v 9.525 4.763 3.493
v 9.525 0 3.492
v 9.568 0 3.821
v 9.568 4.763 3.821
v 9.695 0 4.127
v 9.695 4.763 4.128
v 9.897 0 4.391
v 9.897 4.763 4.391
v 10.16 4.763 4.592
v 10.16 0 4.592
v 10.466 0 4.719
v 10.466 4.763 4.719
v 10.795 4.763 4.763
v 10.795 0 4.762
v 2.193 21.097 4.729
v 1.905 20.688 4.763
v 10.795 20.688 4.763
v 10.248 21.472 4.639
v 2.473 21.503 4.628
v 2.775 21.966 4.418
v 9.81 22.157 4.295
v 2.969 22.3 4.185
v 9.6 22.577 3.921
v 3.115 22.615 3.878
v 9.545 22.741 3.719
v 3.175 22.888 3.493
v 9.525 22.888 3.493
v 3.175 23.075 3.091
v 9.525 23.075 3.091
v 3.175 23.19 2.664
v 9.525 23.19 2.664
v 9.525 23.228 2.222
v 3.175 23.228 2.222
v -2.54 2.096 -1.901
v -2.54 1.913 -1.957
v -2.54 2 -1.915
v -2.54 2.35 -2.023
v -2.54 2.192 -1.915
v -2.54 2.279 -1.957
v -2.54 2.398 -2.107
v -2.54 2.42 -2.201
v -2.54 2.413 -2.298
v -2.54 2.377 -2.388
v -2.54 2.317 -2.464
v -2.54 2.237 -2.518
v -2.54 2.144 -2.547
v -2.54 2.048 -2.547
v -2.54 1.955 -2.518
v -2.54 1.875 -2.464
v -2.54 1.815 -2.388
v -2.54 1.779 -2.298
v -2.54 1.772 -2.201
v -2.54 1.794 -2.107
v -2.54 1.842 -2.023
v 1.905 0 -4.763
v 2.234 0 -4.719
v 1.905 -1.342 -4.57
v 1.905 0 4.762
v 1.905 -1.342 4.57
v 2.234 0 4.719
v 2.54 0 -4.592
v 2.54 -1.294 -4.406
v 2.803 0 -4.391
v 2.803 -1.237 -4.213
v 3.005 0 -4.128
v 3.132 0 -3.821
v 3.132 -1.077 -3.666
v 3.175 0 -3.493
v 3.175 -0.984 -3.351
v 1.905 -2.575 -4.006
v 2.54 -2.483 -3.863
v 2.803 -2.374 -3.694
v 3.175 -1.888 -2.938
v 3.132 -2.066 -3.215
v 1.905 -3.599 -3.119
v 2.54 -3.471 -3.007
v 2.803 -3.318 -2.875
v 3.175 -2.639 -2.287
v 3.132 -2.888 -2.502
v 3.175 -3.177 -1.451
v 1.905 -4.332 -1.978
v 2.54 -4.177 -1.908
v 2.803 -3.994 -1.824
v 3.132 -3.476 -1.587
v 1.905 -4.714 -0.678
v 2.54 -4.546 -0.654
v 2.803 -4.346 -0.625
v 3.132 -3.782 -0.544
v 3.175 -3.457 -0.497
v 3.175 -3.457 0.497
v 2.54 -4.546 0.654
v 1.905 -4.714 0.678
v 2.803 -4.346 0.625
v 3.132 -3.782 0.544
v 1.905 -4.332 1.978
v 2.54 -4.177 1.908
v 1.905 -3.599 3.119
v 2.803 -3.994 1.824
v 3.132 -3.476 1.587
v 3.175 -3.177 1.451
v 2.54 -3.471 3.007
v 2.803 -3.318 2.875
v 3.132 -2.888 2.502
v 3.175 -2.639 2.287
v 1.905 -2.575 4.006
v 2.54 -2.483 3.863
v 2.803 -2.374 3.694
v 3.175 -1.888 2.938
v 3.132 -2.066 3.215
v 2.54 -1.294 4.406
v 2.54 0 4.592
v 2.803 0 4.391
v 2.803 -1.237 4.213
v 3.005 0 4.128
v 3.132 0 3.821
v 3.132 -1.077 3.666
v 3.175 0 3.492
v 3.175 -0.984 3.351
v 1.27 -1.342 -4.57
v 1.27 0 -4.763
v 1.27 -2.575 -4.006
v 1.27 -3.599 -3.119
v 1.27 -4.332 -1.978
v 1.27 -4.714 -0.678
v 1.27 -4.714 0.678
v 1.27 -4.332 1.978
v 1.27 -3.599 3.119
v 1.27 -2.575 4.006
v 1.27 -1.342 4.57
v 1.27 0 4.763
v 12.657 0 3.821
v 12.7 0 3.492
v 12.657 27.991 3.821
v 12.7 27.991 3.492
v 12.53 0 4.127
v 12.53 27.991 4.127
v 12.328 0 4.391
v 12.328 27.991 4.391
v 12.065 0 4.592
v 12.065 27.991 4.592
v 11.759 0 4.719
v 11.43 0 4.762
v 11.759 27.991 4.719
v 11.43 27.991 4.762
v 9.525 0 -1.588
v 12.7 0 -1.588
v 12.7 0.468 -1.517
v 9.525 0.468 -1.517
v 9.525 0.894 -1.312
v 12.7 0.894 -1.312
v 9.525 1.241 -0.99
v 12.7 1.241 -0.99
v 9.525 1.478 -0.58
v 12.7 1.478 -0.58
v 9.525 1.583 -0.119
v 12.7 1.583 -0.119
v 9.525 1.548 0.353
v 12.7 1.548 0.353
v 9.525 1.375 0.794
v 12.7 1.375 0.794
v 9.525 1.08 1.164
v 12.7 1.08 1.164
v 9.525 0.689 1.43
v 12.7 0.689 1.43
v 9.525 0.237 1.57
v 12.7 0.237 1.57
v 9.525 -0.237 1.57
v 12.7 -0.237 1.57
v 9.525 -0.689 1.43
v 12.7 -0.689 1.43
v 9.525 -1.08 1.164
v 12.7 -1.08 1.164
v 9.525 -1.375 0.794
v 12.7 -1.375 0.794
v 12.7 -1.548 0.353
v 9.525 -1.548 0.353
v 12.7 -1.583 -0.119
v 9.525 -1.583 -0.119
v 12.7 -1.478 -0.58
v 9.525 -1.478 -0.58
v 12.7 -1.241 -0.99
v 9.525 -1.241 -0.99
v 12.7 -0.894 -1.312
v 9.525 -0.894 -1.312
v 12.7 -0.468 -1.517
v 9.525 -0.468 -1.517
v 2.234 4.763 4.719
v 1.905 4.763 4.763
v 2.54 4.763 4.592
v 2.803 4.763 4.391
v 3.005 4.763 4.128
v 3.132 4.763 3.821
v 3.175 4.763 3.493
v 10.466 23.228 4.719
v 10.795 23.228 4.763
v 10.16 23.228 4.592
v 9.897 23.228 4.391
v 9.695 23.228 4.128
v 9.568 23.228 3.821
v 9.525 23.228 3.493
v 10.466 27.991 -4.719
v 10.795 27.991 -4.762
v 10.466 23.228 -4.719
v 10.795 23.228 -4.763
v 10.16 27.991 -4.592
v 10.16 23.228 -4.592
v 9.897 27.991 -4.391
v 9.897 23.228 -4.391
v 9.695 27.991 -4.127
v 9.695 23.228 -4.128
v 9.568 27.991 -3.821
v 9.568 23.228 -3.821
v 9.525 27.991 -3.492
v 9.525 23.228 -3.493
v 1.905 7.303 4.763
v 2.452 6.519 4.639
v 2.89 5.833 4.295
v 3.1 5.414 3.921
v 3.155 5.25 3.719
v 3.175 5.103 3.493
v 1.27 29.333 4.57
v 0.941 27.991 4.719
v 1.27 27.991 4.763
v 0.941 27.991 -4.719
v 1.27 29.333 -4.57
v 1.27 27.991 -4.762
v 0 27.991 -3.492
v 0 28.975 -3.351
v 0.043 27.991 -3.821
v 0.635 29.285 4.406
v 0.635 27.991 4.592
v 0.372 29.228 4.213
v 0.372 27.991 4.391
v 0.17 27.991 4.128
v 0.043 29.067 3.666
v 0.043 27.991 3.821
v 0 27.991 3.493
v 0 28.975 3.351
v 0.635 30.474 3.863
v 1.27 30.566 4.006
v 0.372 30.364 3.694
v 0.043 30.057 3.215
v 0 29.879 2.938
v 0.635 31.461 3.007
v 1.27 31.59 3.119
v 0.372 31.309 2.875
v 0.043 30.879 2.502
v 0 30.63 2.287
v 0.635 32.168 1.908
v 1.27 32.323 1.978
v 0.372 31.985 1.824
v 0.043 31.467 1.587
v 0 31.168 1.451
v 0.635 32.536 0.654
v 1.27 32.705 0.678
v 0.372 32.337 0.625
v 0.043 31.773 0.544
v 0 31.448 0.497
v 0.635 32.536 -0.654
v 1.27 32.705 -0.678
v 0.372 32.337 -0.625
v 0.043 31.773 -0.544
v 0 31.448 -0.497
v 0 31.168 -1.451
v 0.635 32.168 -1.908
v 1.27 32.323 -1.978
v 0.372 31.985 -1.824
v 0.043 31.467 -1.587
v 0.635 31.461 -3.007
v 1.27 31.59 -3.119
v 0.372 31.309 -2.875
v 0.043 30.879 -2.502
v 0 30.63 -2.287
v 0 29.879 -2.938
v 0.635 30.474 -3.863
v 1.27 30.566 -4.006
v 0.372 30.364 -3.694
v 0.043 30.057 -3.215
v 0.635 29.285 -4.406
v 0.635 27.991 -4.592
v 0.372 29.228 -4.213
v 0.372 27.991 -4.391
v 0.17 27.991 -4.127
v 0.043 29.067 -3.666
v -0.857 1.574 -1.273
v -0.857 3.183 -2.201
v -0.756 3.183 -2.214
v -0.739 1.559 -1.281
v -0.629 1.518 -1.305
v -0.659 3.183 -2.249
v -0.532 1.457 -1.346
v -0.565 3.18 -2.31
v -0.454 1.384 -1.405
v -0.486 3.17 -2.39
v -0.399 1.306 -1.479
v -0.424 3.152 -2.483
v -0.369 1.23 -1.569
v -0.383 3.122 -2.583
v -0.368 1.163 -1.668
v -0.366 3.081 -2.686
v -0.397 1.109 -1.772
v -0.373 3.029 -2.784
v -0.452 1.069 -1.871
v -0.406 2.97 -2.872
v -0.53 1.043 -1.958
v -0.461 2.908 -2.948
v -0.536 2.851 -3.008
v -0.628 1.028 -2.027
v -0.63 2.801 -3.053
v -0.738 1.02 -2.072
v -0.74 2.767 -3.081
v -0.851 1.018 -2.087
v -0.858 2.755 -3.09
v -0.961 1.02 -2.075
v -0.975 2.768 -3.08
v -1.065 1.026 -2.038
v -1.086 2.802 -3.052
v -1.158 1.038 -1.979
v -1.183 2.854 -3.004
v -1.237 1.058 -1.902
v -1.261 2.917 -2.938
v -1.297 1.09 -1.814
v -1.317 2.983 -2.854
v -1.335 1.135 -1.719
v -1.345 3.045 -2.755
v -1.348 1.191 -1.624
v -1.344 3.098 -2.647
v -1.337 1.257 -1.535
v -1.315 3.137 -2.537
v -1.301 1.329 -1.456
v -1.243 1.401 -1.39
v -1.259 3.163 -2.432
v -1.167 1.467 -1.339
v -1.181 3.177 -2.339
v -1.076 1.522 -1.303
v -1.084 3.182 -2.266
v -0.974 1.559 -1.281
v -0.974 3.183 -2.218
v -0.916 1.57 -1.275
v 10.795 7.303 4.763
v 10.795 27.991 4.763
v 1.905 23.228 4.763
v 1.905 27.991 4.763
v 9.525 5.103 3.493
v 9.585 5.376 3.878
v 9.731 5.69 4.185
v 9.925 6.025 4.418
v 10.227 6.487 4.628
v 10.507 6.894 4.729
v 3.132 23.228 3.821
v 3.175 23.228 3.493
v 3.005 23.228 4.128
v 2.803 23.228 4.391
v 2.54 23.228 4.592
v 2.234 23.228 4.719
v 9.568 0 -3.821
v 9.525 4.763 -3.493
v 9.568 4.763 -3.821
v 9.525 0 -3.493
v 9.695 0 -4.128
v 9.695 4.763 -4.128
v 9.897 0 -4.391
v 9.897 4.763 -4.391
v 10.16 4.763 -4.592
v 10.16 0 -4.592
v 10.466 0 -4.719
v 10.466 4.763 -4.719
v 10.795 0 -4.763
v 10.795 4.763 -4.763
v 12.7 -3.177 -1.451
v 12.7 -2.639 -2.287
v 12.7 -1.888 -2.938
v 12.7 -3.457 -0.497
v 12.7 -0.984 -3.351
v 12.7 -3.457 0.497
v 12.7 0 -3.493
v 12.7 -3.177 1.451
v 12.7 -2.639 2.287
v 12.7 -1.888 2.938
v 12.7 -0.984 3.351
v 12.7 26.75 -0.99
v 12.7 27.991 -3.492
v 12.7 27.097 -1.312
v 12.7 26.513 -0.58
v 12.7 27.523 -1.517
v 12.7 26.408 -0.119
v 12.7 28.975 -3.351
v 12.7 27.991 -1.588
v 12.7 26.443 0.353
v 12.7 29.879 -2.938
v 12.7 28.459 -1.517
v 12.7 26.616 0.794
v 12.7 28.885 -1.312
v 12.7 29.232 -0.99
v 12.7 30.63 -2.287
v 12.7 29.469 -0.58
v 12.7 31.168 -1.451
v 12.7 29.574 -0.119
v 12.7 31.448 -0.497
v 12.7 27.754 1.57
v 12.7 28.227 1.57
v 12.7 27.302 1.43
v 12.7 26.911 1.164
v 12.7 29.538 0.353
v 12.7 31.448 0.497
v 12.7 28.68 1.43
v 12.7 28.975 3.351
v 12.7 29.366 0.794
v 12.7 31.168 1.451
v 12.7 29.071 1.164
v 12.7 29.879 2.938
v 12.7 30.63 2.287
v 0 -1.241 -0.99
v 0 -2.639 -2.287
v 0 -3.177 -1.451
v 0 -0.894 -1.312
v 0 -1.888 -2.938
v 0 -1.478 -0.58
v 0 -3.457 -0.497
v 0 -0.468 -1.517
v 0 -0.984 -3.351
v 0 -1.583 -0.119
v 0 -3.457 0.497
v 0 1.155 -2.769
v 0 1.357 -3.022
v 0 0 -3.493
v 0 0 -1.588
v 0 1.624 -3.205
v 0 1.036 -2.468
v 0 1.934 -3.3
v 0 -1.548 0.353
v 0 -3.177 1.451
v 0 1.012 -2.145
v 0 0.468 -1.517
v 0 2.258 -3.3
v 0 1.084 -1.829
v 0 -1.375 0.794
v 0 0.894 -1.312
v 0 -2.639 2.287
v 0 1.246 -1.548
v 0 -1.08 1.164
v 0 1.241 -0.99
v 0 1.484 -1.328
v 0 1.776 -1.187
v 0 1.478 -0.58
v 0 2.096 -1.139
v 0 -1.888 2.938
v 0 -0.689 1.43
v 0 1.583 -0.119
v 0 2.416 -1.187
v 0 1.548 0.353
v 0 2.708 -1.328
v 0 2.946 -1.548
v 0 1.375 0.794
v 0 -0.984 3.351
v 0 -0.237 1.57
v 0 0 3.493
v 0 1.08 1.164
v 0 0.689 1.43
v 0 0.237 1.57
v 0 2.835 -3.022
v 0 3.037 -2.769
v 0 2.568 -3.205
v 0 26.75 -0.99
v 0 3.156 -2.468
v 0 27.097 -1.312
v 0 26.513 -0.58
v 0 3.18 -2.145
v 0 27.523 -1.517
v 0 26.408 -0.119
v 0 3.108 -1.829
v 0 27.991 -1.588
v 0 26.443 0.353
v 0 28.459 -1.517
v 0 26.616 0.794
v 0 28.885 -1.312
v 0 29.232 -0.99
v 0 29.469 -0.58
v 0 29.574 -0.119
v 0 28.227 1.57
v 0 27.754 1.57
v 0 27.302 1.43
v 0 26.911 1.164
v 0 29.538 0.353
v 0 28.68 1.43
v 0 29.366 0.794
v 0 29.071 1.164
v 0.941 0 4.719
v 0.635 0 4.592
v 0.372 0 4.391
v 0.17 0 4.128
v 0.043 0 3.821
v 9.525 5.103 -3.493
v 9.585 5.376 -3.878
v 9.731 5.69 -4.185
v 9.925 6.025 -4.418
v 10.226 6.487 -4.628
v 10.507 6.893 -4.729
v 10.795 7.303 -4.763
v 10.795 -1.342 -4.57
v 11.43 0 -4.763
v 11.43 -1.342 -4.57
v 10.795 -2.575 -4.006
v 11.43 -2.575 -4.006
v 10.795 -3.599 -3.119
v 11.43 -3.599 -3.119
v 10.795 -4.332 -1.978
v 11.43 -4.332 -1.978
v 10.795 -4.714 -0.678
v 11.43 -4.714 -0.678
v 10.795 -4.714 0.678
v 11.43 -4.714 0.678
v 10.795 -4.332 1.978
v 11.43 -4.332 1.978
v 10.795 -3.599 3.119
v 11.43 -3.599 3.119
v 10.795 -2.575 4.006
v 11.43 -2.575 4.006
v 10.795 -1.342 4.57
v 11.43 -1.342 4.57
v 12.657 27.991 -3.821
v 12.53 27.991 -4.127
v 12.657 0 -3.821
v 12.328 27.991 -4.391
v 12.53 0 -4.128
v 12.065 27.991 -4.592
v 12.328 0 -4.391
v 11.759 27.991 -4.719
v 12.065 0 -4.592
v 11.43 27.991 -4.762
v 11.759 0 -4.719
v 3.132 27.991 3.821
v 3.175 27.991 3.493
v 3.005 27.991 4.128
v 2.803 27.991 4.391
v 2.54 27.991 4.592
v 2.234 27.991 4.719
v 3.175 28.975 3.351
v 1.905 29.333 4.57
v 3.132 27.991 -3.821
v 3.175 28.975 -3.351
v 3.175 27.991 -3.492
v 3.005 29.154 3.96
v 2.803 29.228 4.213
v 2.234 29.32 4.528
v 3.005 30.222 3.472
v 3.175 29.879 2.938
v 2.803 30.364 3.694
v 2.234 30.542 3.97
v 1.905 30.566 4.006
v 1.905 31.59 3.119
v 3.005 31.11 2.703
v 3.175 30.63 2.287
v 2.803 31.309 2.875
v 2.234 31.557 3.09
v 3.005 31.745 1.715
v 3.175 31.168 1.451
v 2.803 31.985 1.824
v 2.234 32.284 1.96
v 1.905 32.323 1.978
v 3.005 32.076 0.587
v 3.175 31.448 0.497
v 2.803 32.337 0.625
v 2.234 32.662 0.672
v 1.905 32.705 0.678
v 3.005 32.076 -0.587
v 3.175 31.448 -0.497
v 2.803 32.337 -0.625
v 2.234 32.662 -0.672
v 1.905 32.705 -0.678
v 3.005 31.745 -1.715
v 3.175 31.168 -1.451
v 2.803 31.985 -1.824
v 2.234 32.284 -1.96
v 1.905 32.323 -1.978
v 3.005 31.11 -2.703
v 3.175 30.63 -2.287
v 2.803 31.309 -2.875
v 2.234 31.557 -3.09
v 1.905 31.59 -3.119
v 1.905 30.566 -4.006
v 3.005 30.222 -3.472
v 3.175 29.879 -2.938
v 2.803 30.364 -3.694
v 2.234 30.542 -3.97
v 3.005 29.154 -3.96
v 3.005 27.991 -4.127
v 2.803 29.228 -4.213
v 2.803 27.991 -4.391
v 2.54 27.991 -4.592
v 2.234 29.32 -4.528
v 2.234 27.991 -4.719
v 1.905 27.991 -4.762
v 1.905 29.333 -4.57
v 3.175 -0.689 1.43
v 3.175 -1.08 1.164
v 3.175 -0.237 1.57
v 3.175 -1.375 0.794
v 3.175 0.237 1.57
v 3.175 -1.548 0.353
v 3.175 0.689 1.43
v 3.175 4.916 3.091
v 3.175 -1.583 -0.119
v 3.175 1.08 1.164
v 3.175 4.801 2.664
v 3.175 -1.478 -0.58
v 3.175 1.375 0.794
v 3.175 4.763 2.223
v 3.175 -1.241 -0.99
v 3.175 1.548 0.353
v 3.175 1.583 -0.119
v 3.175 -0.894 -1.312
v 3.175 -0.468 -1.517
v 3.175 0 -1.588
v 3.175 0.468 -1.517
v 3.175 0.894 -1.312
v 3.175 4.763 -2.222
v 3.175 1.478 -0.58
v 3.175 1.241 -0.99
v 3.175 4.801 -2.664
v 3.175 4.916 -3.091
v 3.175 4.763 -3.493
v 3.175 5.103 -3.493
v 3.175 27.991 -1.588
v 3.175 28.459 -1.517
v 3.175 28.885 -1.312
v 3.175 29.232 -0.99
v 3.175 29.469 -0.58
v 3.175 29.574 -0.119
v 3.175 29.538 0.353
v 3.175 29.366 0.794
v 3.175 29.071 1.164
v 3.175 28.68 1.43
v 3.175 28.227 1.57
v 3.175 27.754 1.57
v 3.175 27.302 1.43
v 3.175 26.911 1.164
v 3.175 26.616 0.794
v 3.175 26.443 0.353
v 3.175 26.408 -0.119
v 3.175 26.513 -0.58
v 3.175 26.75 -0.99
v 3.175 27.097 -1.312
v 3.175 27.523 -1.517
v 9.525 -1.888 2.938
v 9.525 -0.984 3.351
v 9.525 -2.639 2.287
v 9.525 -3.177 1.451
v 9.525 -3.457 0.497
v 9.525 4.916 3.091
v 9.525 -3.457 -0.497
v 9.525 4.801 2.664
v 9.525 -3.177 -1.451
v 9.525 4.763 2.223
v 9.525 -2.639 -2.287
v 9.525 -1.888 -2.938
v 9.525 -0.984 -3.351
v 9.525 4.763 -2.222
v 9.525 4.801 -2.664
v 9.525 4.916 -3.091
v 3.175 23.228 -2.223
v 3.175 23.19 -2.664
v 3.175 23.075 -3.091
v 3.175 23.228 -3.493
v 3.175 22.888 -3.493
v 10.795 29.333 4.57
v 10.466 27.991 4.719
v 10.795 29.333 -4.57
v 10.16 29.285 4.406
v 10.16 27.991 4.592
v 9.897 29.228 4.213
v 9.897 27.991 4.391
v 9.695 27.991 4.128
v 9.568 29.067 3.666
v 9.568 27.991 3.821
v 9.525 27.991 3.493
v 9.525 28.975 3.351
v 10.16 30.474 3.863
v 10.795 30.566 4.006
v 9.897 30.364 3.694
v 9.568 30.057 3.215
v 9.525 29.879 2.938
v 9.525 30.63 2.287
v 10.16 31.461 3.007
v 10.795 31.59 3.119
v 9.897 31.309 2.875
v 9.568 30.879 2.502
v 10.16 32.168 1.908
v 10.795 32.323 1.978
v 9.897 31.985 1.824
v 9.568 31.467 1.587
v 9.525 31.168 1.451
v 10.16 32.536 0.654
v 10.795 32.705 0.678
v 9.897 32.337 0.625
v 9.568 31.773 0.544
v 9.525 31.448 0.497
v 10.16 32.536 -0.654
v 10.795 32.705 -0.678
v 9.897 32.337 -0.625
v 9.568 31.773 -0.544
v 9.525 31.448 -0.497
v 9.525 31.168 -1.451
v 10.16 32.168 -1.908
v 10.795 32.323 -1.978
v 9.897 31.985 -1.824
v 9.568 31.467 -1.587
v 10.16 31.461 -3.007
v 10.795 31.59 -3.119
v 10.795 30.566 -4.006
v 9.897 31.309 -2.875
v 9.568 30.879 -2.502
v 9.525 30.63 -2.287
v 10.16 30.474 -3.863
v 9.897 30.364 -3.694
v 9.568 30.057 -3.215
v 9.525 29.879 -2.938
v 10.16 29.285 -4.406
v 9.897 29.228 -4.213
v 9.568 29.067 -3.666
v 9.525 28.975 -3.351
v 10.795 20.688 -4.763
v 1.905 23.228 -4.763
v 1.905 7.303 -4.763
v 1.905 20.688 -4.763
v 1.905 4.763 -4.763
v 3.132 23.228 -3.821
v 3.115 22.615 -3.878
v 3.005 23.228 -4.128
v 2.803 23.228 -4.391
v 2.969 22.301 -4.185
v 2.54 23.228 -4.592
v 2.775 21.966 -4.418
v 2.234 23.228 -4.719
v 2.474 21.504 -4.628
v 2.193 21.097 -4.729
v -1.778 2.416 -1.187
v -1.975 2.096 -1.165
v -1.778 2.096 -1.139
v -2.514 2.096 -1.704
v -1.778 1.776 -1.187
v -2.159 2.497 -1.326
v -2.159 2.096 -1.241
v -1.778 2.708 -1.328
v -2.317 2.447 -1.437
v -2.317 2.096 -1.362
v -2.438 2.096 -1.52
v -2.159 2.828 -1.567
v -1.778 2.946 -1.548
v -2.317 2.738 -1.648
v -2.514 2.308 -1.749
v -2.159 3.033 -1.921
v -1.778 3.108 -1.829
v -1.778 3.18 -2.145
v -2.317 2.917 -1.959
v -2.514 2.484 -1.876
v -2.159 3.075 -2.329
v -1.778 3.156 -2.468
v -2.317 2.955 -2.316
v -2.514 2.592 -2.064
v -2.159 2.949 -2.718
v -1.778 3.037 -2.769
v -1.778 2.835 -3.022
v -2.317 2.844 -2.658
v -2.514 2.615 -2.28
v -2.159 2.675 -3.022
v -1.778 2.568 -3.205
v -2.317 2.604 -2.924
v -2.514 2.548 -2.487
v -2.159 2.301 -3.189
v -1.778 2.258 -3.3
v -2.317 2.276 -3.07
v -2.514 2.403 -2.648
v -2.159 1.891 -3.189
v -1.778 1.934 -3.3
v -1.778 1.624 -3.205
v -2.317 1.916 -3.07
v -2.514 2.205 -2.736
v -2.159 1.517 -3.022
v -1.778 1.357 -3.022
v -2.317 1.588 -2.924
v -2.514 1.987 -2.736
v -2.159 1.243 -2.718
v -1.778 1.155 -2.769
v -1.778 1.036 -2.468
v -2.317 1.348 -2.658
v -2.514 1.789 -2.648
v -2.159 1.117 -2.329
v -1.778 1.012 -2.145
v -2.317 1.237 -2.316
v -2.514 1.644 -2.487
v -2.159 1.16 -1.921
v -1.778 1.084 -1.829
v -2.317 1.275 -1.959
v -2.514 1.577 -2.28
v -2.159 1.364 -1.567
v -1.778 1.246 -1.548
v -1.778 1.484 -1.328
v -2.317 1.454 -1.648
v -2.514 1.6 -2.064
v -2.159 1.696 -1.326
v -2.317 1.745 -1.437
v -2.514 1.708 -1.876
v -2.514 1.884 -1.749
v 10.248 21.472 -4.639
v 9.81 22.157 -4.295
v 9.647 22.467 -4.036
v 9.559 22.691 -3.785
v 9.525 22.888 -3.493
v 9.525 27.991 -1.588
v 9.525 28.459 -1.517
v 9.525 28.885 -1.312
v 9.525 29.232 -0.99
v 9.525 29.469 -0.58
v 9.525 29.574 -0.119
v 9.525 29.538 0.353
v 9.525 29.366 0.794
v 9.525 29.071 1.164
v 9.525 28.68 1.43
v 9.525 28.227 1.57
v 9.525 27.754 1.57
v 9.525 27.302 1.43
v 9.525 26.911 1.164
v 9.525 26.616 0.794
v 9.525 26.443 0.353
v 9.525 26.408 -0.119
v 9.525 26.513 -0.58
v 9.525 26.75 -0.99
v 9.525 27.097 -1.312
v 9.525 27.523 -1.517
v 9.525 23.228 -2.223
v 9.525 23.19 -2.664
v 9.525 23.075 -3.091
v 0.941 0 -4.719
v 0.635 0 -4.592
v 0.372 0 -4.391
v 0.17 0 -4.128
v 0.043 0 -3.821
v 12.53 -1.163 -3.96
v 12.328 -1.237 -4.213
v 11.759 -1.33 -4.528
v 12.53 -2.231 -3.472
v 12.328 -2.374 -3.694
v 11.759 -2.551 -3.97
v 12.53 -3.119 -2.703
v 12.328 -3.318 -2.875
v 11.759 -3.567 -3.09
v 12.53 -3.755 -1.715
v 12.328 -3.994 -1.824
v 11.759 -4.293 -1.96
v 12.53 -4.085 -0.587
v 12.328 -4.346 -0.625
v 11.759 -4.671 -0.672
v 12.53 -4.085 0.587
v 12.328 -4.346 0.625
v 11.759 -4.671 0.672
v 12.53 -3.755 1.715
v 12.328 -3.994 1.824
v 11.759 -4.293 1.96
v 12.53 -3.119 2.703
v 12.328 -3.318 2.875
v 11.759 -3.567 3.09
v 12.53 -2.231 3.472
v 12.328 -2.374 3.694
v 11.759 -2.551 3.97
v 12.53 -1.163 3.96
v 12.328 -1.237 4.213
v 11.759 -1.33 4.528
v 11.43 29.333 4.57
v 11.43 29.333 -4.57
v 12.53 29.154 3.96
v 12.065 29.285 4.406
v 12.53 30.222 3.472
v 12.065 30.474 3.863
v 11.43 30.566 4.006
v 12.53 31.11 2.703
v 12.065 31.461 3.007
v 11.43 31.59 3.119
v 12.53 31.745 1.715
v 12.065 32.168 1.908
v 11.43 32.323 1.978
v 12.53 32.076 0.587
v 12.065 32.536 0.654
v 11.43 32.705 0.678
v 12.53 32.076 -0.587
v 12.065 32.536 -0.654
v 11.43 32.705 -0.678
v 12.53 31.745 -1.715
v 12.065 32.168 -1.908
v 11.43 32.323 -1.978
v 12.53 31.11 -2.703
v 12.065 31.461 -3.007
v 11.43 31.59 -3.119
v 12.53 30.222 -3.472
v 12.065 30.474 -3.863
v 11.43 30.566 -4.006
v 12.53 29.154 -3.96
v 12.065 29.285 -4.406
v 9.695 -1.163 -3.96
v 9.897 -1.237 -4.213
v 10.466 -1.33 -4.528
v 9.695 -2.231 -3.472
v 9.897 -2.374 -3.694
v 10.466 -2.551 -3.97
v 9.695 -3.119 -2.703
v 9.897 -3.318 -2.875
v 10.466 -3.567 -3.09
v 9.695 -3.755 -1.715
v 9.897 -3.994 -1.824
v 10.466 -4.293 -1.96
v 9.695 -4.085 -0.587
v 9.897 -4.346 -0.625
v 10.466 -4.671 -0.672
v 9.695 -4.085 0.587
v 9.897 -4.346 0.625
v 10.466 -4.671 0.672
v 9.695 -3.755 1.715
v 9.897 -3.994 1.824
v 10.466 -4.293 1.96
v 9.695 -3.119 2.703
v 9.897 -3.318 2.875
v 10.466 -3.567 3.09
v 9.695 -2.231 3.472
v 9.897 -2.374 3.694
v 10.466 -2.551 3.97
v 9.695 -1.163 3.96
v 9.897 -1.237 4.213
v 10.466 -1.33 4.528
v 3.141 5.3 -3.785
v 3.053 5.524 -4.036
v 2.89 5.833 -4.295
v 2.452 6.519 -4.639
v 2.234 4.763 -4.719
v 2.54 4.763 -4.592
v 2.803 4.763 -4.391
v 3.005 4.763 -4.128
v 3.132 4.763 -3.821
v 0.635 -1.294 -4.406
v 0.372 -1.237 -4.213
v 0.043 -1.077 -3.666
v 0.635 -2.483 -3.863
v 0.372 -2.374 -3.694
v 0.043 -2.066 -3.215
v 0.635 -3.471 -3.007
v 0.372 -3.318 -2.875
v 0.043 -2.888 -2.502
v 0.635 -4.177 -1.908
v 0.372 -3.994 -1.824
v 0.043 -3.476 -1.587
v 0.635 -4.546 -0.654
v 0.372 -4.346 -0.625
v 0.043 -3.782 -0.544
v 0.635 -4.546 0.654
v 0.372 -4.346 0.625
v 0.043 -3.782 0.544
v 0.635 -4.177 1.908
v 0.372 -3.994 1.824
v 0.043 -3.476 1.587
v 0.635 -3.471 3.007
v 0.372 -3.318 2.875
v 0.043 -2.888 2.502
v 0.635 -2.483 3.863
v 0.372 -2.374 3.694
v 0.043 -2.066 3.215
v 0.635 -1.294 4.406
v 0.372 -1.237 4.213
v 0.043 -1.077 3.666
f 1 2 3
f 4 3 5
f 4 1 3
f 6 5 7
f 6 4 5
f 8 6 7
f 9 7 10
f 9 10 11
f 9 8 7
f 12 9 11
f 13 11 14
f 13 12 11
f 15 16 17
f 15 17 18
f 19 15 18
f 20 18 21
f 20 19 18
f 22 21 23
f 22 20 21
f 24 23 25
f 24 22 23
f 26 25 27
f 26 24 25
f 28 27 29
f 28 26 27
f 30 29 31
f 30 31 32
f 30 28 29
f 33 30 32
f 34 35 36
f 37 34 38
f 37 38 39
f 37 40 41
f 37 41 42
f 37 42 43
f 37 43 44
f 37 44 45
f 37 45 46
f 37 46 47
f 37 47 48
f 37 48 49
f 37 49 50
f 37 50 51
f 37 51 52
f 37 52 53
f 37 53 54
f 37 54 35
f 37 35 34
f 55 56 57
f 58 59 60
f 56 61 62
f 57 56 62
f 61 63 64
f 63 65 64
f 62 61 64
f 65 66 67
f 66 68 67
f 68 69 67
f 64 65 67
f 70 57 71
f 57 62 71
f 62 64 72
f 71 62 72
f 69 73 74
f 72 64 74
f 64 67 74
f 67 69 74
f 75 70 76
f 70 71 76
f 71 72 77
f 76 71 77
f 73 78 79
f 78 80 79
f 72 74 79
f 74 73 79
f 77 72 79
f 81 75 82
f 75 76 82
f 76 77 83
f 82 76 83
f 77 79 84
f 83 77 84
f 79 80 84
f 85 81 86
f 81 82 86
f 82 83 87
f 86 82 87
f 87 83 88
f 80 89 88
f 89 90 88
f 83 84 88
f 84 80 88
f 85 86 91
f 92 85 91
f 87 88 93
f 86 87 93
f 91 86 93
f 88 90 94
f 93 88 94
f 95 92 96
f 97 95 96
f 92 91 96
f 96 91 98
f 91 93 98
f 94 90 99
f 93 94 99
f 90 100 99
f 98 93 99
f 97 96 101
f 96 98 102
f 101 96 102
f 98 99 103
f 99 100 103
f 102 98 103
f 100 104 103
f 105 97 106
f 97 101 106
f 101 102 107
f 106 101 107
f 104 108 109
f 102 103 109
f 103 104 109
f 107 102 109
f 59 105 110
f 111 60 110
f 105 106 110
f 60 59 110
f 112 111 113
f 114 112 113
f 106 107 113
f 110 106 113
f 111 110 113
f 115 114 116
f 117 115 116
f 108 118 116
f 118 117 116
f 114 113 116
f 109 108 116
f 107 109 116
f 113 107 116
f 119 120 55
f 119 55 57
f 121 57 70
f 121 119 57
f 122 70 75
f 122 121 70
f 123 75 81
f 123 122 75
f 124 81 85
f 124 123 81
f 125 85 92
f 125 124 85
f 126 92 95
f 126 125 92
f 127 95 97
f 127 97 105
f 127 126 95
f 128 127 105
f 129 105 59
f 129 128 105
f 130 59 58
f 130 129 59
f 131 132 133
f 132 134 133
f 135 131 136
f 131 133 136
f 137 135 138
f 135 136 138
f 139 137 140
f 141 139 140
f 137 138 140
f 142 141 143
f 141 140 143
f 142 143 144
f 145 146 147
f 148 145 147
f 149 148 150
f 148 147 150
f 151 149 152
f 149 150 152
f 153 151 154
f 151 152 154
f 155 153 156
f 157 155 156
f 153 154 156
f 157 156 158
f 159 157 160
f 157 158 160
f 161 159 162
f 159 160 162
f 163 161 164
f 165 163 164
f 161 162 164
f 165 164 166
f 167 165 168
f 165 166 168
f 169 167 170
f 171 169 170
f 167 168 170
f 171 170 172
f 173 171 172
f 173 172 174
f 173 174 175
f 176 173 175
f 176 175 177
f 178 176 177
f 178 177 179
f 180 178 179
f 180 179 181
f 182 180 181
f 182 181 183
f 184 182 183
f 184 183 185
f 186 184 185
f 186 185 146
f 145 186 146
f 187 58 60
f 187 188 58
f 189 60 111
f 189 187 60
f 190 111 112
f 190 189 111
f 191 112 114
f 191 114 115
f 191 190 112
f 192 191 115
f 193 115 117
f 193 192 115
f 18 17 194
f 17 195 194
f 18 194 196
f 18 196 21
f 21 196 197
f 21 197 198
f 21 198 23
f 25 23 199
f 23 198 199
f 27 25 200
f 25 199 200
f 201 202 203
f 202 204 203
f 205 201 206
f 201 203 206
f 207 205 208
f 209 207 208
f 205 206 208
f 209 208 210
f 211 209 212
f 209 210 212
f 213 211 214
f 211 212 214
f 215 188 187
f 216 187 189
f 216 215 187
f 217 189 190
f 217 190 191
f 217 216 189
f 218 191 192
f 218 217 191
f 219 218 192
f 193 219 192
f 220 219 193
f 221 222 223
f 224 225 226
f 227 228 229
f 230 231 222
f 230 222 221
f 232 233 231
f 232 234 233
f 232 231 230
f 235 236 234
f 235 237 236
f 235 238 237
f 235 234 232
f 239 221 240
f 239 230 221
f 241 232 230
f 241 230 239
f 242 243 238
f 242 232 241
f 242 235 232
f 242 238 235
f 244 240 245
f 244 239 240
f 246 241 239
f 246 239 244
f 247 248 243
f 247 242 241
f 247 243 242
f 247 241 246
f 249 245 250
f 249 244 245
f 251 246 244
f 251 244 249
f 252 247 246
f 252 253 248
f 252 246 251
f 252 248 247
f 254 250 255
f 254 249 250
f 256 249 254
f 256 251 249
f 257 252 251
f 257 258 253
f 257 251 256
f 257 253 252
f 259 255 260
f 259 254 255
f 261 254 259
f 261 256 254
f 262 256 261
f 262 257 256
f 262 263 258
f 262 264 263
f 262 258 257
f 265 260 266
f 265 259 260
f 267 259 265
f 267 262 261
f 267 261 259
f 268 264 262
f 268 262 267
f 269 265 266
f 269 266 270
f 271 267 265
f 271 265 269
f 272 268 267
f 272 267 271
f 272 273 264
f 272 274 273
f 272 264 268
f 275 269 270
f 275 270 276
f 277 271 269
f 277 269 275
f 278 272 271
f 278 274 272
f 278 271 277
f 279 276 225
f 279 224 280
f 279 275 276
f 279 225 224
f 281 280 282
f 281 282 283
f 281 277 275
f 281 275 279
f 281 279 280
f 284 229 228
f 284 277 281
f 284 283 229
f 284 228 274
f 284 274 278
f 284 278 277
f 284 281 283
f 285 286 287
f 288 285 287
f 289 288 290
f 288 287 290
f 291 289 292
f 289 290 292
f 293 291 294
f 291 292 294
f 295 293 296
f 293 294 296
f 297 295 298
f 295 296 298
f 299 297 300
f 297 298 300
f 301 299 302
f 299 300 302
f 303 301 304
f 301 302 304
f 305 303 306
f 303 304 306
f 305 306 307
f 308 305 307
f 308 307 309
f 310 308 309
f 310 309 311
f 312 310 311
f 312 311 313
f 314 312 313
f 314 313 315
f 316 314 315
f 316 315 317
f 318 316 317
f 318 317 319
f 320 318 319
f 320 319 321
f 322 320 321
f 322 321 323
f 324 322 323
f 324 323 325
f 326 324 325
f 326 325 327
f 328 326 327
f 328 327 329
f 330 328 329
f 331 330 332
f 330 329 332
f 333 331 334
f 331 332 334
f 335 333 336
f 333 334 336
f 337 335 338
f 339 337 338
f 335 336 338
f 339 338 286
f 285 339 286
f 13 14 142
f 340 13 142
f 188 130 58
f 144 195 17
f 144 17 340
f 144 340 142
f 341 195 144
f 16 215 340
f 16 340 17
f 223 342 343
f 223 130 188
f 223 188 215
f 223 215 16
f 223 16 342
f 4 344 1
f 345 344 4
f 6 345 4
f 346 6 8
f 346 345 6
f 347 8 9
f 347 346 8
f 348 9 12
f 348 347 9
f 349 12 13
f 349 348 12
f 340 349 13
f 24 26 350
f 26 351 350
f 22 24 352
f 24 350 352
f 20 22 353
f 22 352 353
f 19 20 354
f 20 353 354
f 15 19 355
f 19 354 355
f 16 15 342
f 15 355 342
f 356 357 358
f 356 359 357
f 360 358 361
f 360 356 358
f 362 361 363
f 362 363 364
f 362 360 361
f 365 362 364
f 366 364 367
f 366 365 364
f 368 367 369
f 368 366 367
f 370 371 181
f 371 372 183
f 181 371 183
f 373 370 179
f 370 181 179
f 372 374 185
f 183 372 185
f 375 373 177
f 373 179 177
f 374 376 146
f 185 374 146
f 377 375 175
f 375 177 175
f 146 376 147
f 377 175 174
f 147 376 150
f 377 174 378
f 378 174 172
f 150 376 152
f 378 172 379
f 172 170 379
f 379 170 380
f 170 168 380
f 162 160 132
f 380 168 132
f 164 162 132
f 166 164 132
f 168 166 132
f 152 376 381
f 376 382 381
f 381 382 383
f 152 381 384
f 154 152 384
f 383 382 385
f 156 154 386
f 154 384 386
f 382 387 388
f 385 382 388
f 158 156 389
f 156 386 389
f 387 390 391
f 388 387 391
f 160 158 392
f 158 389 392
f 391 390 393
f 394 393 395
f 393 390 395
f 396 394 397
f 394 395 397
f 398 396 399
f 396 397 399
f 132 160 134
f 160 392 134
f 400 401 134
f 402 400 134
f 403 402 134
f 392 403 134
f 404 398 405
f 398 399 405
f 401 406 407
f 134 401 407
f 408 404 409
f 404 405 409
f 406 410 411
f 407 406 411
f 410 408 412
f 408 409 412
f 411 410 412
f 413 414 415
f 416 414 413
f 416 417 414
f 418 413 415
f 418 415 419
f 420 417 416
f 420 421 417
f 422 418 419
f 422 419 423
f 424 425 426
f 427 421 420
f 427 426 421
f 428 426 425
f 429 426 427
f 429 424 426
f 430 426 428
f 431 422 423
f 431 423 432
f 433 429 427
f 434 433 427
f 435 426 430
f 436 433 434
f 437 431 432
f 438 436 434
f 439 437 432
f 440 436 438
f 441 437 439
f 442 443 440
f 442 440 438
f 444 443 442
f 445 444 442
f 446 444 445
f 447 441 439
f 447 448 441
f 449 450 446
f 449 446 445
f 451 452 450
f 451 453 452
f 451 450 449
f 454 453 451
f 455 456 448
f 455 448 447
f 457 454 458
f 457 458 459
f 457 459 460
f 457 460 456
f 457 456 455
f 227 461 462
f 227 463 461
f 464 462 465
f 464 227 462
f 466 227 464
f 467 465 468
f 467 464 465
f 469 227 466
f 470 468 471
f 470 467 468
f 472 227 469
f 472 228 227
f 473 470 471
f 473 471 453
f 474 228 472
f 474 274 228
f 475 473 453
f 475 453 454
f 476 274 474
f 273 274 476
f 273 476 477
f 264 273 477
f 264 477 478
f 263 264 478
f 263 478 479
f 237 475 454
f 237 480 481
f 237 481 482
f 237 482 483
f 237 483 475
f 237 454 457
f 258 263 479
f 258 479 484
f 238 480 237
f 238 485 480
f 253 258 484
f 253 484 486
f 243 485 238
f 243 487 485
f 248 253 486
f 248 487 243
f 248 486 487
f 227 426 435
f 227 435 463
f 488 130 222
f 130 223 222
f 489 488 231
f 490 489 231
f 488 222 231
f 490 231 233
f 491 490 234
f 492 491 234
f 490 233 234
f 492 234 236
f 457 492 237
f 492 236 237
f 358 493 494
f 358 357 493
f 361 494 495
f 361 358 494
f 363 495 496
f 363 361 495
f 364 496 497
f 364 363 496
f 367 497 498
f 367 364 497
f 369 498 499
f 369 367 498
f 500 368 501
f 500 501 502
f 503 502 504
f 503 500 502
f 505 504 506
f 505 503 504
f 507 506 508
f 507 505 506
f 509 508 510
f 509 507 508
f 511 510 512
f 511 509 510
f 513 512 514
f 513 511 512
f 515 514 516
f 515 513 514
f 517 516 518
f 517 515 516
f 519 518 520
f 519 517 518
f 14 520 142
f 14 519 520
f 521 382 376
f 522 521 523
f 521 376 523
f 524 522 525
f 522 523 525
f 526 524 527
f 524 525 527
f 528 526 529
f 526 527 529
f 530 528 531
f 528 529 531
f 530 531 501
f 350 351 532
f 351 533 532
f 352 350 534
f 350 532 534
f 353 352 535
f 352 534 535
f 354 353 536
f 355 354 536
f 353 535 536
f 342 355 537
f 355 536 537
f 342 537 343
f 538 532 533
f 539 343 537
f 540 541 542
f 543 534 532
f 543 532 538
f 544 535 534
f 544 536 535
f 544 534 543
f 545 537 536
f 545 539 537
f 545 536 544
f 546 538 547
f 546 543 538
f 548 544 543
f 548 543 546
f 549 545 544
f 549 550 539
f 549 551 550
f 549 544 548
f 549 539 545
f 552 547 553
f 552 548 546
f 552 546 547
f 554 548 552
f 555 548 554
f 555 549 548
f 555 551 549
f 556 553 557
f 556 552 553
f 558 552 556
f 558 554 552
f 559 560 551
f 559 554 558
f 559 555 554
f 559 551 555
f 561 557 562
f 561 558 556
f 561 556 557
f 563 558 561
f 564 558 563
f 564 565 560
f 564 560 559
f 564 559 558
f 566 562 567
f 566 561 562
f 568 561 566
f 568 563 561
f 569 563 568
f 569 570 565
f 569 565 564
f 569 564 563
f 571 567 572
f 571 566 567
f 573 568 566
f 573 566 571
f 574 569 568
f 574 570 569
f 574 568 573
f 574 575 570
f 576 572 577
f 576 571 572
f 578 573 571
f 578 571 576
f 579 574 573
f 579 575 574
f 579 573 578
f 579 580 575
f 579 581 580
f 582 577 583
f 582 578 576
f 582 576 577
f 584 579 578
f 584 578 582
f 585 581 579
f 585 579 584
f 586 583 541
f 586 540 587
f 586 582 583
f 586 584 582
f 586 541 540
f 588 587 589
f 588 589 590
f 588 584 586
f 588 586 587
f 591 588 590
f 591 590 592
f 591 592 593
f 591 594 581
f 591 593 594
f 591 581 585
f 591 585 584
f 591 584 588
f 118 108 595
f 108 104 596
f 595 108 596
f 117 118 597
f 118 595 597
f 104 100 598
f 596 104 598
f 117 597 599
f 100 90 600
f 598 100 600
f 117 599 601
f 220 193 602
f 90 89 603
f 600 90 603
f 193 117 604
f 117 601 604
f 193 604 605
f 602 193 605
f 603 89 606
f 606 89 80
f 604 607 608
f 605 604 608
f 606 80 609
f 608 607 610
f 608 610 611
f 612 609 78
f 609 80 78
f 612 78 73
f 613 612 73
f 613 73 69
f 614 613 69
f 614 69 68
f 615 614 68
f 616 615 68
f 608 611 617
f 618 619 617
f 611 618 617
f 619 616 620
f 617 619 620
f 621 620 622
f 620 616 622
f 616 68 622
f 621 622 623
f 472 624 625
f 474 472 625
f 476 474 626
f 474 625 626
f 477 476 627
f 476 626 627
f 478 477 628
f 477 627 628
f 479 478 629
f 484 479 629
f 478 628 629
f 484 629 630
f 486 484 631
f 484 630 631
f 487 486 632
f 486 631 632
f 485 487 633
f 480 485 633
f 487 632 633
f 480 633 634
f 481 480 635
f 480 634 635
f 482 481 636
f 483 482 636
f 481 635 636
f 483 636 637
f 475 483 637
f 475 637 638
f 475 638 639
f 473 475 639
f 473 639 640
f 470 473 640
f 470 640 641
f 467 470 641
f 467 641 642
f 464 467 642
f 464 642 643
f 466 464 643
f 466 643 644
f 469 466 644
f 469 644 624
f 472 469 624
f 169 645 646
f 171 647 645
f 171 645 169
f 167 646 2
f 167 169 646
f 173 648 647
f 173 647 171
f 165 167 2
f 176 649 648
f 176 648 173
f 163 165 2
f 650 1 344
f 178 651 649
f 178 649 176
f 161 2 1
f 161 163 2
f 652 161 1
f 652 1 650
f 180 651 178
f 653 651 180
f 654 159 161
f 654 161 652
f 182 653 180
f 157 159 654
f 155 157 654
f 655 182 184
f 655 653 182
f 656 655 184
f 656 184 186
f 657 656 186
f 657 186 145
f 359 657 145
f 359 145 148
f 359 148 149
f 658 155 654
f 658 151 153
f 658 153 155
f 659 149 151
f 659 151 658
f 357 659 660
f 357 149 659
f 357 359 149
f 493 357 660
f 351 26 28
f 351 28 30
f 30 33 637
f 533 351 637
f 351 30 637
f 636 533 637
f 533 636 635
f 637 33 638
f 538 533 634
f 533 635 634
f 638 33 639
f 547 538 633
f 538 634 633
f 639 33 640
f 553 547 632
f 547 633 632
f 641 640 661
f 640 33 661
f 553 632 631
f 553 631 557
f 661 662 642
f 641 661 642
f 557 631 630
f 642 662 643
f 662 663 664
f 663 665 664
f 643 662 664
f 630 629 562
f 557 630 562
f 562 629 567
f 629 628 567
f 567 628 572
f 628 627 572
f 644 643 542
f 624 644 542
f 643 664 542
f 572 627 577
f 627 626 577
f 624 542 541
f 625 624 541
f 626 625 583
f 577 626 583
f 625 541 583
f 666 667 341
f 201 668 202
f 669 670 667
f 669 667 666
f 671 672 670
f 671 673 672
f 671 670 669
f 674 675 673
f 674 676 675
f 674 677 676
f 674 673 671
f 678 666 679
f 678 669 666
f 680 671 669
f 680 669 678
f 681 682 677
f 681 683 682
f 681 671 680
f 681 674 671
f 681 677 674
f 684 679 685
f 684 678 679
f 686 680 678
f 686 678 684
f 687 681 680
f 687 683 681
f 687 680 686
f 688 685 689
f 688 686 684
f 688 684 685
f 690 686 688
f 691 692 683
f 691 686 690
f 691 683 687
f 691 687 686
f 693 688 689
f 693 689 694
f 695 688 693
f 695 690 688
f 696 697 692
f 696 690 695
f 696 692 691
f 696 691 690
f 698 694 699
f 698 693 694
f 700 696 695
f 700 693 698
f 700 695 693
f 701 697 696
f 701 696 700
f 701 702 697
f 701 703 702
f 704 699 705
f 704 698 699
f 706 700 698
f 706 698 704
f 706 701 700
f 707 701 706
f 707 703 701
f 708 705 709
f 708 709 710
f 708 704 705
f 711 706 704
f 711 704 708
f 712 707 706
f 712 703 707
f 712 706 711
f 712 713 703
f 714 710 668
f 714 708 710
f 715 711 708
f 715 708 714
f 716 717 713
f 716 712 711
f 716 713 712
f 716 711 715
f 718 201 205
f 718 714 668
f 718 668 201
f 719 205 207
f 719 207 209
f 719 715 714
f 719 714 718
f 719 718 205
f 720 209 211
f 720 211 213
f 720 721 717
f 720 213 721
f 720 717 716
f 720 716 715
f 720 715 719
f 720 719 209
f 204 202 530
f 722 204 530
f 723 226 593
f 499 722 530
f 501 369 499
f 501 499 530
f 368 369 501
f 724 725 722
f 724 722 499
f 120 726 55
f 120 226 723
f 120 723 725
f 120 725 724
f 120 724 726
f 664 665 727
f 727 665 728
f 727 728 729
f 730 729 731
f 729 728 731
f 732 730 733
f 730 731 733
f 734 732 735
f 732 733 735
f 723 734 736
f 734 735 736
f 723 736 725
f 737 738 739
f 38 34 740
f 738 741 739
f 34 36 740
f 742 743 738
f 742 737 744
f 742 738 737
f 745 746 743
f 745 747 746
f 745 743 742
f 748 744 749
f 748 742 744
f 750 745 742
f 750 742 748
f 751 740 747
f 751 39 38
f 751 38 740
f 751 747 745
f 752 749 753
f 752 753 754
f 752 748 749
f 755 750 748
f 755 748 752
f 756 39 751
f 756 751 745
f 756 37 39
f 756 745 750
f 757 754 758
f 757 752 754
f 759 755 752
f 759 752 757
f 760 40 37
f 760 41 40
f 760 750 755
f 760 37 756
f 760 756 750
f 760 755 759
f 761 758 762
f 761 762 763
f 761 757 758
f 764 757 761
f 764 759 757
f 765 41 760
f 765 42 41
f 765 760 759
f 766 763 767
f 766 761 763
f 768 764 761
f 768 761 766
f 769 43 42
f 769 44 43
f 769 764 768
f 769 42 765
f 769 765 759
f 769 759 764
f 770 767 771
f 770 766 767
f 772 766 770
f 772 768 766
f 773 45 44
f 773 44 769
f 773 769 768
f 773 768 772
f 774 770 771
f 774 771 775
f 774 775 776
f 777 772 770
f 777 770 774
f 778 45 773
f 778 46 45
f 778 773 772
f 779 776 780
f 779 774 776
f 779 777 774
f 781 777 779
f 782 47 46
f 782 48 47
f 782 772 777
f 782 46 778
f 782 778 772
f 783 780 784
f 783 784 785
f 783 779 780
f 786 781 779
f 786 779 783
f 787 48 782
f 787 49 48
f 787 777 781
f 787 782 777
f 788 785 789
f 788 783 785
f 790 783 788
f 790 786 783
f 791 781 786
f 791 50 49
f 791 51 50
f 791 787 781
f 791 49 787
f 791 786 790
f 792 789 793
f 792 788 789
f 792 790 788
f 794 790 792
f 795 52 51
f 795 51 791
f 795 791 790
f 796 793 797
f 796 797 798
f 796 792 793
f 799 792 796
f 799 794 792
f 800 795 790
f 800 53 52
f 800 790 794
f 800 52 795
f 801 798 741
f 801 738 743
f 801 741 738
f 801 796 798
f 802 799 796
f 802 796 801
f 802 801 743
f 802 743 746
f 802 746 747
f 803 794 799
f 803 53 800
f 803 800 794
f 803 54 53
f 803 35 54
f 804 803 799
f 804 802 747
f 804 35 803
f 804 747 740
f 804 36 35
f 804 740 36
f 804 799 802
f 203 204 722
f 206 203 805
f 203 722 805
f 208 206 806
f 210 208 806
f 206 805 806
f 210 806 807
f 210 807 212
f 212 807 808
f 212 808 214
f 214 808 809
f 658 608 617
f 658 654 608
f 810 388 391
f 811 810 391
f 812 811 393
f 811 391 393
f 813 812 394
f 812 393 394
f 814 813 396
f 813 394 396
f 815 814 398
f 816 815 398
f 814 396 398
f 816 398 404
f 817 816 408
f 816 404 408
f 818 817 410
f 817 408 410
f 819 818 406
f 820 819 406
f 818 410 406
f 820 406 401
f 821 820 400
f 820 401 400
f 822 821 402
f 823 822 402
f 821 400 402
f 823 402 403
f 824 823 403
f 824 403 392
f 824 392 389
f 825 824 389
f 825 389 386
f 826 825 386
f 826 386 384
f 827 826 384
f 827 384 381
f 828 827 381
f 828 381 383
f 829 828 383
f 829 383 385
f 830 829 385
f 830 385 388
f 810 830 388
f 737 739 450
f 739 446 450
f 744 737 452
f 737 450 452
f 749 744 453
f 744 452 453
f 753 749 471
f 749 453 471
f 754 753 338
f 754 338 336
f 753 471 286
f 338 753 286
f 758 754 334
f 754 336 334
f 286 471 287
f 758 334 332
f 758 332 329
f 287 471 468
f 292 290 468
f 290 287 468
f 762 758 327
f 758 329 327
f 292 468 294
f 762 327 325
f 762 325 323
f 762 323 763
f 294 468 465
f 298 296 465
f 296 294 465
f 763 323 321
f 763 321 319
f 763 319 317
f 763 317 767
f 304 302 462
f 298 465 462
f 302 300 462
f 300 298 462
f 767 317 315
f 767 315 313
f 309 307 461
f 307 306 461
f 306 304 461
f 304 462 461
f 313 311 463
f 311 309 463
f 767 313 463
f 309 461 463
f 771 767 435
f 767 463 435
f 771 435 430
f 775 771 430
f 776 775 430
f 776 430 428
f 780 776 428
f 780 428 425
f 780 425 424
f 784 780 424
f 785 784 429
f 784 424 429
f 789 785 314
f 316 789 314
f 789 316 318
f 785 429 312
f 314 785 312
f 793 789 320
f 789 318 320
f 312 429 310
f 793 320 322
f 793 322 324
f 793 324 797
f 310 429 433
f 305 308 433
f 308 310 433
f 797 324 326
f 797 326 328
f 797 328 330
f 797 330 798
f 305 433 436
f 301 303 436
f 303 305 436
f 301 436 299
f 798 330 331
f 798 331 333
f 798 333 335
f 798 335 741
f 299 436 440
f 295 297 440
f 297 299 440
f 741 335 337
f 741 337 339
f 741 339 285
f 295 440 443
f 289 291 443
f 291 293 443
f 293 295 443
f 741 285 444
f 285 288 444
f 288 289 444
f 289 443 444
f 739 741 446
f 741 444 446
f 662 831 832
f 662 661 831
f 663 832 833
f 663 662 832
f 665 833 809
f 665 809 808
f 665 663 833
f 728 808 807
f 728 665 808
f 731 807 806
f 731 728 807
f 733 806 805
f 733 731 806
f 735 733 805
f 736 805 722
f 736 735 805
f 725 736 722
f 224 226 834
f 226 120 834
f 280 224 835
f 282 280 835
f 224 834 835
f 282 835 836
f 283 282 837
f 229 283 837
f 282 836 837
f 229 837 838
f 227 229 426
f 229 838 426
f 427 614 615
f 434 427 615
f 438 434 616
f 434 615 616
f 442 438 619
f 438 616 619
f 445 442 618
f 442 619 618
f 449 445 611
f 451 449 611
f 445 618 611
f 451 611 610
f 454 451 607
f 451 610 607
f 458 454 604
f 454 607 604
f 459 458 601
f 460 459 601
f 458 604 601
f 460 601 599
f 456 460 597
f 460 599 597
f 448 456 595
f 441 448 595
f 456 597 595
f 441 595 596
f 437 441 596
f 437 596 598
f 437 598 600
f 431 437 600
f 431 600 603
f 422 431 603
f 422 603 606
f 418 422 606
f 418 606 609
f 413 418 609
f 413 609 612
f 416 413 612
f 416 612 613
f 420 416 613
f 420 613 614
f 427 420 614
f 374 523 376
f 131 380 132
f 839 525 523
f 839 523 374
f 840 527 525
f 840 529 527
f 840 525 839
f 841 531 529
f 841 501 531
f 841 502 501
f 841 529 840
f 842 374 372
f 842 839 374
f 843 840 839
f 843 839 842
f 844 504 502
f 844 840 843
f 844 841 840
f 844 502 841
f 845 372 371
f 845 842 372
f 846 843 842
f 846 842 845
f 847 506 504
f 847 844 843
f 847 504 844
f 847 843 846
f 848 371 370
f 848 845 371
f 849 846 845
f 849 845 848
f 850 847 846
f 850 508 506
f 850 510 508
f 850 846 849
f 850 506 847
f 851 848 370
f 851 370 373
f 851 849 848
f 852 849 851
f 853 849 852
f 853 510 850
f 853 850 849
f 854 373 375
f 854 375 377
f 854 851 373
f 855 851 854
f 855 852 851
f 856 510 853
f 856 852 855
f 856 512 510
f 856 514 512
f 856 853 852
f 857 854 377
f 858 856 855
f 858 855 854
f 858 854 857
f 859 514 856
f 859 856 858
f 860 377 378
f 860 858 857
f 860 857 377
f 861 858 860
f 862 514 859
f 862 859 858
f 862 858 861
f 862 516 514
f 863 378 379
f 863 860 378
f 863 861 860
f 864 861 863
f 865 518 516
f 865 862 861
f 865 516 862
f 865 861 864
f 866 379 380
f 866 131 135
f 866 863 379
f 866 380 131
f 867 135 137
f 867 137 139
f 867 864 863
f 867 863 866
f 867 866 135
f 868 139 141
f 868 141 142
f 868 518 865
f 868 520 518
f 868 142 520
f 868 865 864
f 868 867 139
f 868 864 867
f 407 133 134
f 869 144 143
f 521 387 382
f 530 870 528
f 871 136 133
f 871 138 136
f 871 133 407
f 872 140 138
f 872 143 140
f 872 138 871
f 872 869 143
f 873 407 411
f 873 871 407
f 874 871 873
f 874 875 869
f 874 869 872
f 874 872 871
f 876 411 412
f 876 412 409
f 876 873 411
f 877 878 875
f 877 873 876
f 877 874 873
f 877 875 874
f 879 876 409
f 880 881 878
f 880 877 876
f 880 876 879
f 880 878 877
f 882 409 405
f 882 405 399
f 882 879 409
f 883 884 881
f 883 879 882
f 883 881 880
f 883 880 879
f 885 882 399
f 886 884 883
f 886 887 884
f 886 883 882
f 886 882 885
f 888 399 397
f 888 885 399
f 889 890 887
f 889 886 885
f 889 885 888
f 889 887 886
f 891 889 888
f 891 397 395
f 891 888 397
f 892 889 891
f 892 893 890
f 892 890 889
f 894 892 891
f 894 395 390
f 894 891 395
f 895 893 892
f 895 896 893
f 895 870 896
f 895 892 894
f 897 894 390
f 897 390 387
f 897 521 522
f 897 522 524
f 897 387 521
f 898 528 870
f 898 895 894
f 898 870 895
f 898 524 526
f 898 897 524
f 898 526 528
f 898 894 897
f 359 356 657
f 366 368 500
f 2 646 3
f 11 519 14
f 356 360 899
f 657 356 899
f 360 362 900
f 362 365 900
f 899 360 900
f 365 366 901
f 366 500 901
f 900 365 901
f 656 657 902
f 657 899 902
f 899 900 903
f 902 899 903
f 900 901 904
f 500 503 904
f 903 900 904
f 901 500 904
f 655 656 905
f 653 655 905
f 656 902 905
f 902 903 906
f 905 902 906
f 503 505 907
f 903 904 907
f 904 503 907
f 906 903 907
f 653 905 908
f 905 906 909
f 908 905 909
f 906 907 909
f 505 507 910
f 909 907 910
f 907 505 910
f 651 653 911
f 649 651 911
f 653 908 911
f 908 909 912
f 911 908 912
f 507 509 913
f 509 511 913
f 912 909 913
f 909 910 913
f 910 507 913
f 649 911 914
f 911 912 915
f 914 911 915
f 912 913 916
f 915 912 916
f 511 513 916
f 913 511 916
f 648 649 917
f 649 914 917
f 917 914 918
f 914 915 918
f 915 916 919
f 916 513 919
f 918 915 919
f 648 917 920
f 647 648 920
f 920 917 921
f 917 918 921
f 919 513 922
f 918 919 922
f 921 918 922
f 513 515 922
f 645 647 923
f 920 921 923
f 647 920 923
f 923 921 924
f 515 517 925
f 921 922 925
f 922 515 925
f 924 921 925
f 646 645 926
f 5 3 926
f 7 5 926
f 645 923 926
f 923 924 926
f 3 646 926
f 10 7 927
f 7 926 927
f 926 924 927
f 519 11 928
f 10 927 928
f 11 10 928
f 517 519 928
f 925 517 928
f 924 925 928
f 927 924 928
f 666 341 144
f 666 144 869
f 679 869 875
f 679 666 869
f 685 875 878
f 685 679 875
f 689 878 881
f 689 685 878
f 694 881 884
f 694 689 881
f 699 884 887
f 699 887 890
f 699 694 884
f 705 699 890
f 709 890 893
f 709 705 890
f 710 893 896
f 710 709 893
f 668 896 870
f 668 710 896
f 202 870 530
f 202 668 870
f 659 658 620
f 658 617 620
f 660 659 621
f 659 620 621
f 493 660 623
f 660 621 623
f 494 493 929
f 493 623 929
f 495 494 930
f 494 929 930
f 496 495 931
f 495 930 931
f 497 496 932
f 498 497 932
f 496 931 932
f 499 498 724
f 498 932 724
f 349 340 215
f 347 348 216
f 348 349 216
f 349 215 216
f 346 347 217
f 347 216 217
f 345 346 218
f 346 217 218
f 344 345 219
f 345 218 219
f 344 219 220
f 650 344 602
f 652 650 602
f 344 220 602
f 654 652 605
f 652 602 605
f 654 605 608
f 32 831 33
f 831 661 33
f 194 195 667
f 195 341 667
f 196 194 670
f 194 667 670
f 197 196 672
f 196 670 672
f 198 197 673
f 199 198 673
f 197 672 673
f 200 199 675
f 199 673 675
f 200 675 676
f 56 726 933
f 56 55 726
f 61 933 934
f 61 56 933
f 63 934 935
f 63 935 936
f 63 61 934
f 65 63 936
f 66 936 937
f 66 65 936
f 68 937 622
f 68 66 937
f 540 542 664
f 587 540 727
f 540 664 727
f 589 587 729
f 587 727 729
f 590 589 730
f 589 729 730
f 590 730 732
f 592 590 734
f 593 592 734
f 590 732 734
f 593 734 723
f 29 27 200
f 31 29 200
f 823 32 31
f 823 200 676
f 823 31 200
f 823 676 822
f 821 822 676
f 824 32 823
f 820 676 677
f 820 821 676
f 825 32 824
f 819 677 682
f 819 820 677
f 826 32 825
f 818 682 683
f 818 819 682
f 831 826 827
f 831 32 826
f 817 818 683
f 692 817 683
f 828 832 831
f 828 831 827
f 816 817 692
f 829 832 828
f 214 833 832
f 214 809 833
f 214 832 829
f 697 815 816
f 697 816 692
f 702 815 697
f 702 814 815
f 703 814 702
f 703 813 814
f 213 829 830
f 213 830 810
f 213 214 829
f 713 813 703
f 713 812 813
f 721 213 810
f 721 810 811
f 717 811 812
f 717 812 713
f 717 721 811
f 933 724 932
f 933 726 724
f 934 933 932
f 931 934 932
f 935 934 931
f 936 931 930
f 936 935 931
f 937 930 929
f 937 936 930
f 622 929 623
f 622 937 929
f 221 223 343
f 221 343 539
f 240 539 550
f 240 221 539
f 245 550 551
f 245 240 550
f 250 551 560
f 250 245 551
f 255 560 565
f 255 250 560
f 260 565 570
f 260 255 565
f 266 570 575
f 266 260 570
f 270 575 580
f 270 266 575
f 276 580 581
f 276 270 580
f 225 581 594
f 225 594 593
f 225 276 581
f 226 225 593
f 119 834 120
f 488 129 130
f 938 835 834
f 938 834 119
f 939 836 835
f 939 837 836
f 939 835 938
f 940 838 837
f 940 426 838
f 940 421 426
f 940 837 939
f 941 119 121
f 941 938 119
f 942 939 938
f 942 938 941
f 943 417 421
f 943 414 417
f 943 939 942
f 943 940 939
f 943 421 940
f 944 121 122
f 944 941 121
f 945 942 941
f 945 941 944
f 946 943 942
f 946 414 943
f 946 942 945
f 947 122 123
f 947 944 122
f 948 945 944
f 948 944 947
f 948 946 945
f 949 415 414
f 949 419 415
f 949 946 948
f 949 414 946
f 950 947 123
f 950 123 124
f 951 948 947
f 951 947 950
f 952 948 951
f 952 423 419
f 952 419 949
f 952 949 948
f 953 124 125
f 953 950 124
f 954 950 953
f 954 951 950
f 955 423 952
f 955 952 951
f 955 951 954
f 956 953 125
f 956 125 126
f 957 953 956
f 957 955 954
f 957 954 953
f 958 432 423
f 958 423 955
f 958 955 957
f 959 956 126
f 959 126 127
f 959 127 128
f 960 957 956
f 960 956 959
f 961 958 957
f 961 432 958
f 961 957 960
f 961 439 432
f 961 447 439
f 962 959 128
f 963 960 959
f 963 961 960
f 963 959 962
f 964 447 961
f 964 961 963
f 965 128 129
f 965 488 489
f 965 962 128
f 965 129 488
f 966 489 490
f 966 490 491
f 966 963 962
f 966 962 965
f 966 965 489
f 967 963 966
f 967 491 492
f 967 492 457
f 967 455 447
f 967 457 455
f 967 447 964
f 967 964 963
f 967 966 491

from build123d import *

# Parameters (mm, degrees)
BOSS_EXTRUDE1_DEPTH = 12.7
SKETCH2_R           = 1.5875
CUT_EXTRUDE1_DEPTH  = 19.05
CUT_EXTRUDE2_DEPTH  = 3.175
FILLET2_R           = 2.54
FILLET3_R           = 1.27
SKETCH3_R           = 1.086795662
BOSS_EXTRUDE2_DEPTH = 2.54
FILLET4_R           = 0.762
SKETCH4_R           = 0.491571792
CUT_EXTRUDE3_DEPTH  = 2.54


with BuildPart() as part:
    # Sketch1 → Boss-Extrude1 (new body)
    with BuildSketch(Plane(origin=(0, 0, 0), x_dir=(0, 0, -1), z_dir=(1, 0, 0))):
        with BuildLine():
            Line((-4.7625, 0), (-4.7625, 27.9908))
            ThreePointArc((-4.7625, 27.9908), (0, 32.7533), (4.7625, 27.9908))
            Line((4.7625, 27.9908), (4.7625, 0))
            ThreePointArc((4.7625, 0), (0, -4.7625), (-4.7625, 0))
        make_face()
    extrude(amount=BOSS_EXTRUDE1_DEPTH)

    # Sketch2 → Cut-Extrude1 (cut)
    with BuildSketch(Plane(origin=(12.7, 0, 0), x_dir=(0, 0, -1), z_dir=(1, 0, 0))):
        Circle(SKETCH2_R)
        with Locations((0, 27.9908)):
            Circle(SKETCH2_R)
    extrude(amount=-CUT_EXTRUDE1_DEPTH, mode=Mode.SUBTRACT)

    # 3DSketch1 → Cut-Extrude2 (cut, symmetric)
    with BuildSketch(Plane(origin=(6.35, 27.9908, -4.7625), x_dir=(0, -0.9466889316456175, 0.322149137356721), z_dir=(1, 0, 0))):
        with BuildLine():
            Line((0, 0), (4.508606037, 1.534235267))
            Line((4.508606037, 1.534235267), (7.57707657, -7.482976807))
            Line((7.57707657, -7.482976807), (3.068470533, -9.017212074))
            ThreePointArc((3.068470533, -9.017212074), (-2.97437077, -6.042841304), (0, 0))
        make_face()
        with BuildLine():
            Line((29.567051081, 0), (25.058445044, -1.534235267))
            Line((25.058445044, -1.534235267), (21.989974511, 7.482976807))
            Line((21.989974511, 7.482976807), (26.498580548, 9.017212074))
            ThreePointArc((26.498580548, 9.017212074), (32.541421852, 6.042841304), (29.567051081, 0))
        make_face()
    extrude(amount=CUT_EXTRUDE2_DEPTH, both=True, mode=Mode.SUBTRACT)

    # Fillet2
    fillet2_edges = [part.edges().sort_by_distance(p)[0] for p in [
        (6.35, 23.2283, -4.7625),
        (6.35, 4.7625, -4.7625),
        (6.35, 4.7625, 4.7625),
        (6.35, 23.2283, 4.7625),
    ]]
    fillet(fillet2_edges, radius=FILLET2_R)

    # Fillet3
    fillet3_edges = [part.edges().sort_by_distance(p)[0] for p in [
        (12.7, 32.7533, 0),
        (12.7, 13.9954, 4.7625),
        (9.525, 24.33955, 4.7625),
        (9.525, 24.33955, -4.7625),
        (3.175, 24.33955, -4.7625),
        (3.175, 24.33955, 4.7625),
        (12.7, -4.7625, 0),
        (0, 13.9954, 4.7625),
        (0, 32.7533, 0),
        (9.525, 3.65125, -4.7625),
        (9.525, 3.65125, 4.7625),
        (0, 13.9954, -4.7625),
        (3.175, 3.65125, 4.7625),
        (3.175, 3.65125, -4.7625),
        (0, -4.7625, 0),
        (12.7, 13.9954, -4.7625),
    ]]
    fillet(fillet3_edges, radius=FILLET3_R)

    # Sketch3 → Boss-Extrude2 (add)
    with BuildSketch(Plane.ZY):
        with Locations((-2.225739377, 2.096022994)):
            Circle(SKETCH3_R)
    extrude(amount=BOSS_EXTRUDE2_DEPTH)

    # Fillet4
    fillet4_edges = [part.edges().sort_by_distance(p)[0] for p in [
        (-2.54, 2.096022994, -3.312535039),
    ]]
    fillet(fillet4_edges, radius=FILLET4_R)

    # Sketch4 → Cut-Extrude3 (cut)
    with BuildSketch(Plane(origin=(0, 3.476983319, -2.007437255), x_dir=(-1, 0, 0), z_dir=(0, 0.8660254037844399, -0.4999999999999979))):
        with Locations(Location((0.856605906, -0.806785971, 0), (0, 0, 90))):
            Circle(SKETCH4_R)
    extrude(amount=-CUT_EXTRUDE3_DEPTH, mode=Mode.SUBTRACT)


solid = part.part
